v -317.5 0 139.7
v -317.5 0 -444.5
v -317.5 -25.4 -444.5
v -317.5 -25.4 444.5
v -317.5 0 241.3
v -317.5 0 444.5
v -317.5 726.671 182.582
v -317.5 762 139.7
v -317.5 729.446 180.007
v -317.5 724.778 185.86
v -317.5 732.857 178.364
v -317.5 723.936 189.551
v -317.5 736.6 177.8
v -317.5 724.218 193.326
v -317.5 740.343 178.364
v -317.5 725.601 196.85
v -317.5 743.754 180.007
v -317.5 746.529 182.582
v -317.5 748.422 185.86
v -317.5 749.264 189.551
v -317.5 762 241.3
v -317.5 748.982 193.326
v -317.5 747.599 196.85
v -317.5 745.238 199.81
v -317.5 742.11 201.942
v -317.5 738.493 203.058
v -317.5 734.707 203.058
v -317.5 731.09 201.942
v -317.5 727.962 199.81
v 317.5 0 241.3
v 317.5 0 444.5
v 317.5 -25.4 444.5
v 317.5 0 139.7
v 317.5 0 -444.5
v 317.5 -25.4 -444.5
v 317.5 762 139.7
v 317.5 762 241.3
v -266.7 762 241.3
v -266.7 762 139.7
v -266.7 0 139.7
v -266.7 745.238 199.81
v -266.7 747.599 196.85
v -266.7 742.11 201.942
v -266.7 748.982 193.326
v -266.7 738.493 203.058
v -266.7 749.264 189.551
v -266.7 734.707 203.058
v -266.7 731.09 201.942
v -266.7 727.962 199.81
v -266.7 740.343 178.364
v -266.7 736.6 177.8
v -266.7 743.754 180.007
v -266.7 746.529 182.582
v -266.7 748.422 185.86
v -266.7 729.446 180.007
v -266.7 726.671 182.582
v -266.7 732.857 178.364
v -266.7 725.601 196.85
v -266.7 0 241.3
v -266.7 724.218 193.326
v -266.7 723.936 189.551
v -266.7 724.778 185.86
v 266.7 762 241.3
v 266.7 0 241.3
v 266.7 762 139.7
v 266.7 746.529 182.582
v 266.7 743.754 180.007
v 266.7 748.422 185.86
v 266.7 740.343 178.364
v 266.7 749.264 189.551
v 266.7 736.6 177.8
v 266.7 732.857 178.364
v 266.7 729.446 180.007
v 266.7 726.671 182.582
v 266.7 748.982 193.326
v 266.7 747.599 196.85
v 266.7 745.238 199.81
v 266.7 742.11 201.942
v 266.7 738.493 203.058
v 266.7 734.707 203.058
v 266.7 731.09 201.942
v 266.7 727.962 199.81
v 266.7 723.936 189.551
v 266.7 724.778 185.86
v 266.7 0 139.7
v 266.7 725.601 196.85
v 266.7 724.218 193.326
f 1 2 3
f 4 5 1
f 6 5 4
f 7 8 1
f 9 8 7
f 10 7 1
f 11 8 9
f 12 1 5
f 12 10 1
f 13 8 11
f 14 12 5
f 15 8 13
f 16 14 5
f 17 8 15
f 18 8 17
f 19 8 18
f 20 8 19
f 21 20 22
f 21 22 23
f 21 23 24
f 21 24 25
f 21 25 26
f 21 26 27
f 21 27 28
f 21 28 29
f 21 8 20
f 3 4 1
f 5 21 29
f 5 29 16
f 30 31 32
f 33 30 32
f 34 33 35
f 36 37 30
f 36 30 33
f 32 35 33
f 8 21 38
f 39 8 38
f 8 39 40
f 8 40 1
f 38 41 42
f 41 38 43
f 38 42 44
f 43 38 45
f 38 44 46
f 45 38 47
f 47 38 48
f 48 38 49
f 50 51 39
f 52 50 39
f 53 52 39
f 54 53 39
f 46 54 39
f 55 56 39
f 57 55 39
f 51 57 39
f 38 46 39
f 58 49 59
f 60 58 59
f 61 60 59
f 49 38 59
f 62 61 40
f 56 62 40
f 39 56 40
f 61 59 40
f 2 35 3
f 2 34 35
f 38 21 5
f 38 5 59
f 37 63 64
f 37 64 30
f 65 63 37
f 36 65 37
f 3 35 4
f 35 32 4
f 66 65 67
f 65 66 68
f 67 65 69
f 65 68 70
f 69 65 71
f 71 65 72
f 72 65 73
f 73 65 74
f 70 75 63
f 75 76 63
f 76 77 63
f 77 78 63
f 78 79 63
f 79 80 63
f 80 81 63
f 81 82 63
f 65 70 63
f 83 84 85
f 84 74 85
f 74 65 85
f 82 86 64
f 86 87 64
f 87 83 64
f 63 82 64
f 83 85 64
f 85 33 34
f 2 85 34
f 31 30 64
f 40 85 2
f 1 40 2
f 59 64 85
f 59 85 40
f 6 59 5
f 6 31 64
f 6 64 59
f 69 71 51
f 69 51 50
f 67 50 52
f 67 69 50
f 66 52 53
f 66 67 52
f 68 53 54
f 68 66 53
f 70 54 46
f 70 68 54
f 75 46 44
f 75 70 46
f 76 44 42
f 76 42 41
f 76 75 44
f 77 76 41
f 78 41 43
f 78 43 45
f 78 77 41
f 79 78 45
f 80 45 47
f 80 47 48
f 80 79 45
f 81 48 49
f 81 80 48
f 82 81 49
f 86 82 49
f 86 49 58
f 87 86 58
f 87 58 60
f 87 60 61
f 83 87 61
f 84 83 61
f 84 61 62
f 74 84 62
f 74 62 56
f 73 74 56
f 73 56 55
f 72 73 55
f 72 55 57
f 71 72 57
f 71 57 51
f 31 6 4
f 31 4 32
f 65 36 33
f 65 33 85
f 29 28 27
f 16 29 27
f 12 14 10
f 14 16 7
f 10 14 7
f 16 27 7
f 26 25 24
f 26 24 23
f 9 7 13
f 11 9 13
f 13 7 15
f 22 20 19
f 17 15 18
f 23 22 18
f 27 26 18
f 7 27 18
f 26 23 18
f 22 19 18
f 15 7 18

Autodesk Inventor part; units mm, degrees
ref_plane "YZ Plane" through (0, 0, 0) normal (1, 0, 0) x (0, 1, 0)
ref_plane "XZ Plane" through (0, 0, 0) normal (0, 1, 0) x (-1, 0, 0)
ref_plane "XY Plane" through (0, 0, 0) normal (0, 0, 1) x (1, 0, 0)
sketch "Sketch1" plane through (0, 0, 0) normal (0, 1, 0) x (-1, 0, 0)
  line L0 (317.5, 444.5) -> (-317.5, 444.5)
  line L1 (-317.5, 444.5) -> (-317.5, -444.5)
  line L2 (-317.5, -444.5) -> (317.5, -444.5)
  line L3 (317.5, -444.5) -> (317.5, 444.5)
  line L4 (317.5, 444.5) -> (-317.5, -444.5) construction
  line L5 (-317.5, 444.5) -> (317.5, -444.5) construction
  point P0 (0, 0)
  dimension "d0" = 635
  dimension "d1" = 889
extrude "Extrusion1" add sketch "Sketch1" against normal blind 25.4
sketch "Sketch2" plane through (0, 0, 0) normal (0, 1, 0) x (1, 0, 0)
  line L0 (-317.5, -444.5) -> (-317.5, 444.5) projected
  line L1 (-317.5, -241.3) -> (-266.7, -241.3)
  line L2 (-266.7, -241.3) -> (-266.7, -139.7)
  line L3 (-266.7, -139.7) -> (-317.5, -139.7)
  line L4 (-317.5, -139.7) -> (-317.5, -241.3)
  line L5 (-317.5, -444.5) -> (317.5, -444.5) projected
  point P0 (0, 0)
  dimension "d6" = 101.6
  dimension "d7" = 50.8
  dimension "d8" = 203.2
extrude "Extrusion2" add sketch "Sketch2" along normal blind 762
mirror "Mirror1" about plane through (0, 0, 0) normal (1, 0, 0) of "Extrusion2"
sketch "Sketch3" plane through (317.5, -25.4, 444.5) normal (1, 0, 0) x (0, 0, -1)
  line L0 (304.8, 787.4) -> (203.2, 787.4) construction
  line L1 (254, 787.4) -> (254, -228.6) construction
  circle A0 centre (254, 762) radius 12.7
  point P0 (444.5, 25.4)
  dimension "d9" = 25.4
  dimension "d10" = 25.4
extrude "Extrusion4" add sketch "Sketch3" against normal through all
equation "\"d4\" = heightOfArm"
equation "\"robotLength\" = 889"
equation "\"heightOfArm\" = 762"
properties part number "Catapult"
